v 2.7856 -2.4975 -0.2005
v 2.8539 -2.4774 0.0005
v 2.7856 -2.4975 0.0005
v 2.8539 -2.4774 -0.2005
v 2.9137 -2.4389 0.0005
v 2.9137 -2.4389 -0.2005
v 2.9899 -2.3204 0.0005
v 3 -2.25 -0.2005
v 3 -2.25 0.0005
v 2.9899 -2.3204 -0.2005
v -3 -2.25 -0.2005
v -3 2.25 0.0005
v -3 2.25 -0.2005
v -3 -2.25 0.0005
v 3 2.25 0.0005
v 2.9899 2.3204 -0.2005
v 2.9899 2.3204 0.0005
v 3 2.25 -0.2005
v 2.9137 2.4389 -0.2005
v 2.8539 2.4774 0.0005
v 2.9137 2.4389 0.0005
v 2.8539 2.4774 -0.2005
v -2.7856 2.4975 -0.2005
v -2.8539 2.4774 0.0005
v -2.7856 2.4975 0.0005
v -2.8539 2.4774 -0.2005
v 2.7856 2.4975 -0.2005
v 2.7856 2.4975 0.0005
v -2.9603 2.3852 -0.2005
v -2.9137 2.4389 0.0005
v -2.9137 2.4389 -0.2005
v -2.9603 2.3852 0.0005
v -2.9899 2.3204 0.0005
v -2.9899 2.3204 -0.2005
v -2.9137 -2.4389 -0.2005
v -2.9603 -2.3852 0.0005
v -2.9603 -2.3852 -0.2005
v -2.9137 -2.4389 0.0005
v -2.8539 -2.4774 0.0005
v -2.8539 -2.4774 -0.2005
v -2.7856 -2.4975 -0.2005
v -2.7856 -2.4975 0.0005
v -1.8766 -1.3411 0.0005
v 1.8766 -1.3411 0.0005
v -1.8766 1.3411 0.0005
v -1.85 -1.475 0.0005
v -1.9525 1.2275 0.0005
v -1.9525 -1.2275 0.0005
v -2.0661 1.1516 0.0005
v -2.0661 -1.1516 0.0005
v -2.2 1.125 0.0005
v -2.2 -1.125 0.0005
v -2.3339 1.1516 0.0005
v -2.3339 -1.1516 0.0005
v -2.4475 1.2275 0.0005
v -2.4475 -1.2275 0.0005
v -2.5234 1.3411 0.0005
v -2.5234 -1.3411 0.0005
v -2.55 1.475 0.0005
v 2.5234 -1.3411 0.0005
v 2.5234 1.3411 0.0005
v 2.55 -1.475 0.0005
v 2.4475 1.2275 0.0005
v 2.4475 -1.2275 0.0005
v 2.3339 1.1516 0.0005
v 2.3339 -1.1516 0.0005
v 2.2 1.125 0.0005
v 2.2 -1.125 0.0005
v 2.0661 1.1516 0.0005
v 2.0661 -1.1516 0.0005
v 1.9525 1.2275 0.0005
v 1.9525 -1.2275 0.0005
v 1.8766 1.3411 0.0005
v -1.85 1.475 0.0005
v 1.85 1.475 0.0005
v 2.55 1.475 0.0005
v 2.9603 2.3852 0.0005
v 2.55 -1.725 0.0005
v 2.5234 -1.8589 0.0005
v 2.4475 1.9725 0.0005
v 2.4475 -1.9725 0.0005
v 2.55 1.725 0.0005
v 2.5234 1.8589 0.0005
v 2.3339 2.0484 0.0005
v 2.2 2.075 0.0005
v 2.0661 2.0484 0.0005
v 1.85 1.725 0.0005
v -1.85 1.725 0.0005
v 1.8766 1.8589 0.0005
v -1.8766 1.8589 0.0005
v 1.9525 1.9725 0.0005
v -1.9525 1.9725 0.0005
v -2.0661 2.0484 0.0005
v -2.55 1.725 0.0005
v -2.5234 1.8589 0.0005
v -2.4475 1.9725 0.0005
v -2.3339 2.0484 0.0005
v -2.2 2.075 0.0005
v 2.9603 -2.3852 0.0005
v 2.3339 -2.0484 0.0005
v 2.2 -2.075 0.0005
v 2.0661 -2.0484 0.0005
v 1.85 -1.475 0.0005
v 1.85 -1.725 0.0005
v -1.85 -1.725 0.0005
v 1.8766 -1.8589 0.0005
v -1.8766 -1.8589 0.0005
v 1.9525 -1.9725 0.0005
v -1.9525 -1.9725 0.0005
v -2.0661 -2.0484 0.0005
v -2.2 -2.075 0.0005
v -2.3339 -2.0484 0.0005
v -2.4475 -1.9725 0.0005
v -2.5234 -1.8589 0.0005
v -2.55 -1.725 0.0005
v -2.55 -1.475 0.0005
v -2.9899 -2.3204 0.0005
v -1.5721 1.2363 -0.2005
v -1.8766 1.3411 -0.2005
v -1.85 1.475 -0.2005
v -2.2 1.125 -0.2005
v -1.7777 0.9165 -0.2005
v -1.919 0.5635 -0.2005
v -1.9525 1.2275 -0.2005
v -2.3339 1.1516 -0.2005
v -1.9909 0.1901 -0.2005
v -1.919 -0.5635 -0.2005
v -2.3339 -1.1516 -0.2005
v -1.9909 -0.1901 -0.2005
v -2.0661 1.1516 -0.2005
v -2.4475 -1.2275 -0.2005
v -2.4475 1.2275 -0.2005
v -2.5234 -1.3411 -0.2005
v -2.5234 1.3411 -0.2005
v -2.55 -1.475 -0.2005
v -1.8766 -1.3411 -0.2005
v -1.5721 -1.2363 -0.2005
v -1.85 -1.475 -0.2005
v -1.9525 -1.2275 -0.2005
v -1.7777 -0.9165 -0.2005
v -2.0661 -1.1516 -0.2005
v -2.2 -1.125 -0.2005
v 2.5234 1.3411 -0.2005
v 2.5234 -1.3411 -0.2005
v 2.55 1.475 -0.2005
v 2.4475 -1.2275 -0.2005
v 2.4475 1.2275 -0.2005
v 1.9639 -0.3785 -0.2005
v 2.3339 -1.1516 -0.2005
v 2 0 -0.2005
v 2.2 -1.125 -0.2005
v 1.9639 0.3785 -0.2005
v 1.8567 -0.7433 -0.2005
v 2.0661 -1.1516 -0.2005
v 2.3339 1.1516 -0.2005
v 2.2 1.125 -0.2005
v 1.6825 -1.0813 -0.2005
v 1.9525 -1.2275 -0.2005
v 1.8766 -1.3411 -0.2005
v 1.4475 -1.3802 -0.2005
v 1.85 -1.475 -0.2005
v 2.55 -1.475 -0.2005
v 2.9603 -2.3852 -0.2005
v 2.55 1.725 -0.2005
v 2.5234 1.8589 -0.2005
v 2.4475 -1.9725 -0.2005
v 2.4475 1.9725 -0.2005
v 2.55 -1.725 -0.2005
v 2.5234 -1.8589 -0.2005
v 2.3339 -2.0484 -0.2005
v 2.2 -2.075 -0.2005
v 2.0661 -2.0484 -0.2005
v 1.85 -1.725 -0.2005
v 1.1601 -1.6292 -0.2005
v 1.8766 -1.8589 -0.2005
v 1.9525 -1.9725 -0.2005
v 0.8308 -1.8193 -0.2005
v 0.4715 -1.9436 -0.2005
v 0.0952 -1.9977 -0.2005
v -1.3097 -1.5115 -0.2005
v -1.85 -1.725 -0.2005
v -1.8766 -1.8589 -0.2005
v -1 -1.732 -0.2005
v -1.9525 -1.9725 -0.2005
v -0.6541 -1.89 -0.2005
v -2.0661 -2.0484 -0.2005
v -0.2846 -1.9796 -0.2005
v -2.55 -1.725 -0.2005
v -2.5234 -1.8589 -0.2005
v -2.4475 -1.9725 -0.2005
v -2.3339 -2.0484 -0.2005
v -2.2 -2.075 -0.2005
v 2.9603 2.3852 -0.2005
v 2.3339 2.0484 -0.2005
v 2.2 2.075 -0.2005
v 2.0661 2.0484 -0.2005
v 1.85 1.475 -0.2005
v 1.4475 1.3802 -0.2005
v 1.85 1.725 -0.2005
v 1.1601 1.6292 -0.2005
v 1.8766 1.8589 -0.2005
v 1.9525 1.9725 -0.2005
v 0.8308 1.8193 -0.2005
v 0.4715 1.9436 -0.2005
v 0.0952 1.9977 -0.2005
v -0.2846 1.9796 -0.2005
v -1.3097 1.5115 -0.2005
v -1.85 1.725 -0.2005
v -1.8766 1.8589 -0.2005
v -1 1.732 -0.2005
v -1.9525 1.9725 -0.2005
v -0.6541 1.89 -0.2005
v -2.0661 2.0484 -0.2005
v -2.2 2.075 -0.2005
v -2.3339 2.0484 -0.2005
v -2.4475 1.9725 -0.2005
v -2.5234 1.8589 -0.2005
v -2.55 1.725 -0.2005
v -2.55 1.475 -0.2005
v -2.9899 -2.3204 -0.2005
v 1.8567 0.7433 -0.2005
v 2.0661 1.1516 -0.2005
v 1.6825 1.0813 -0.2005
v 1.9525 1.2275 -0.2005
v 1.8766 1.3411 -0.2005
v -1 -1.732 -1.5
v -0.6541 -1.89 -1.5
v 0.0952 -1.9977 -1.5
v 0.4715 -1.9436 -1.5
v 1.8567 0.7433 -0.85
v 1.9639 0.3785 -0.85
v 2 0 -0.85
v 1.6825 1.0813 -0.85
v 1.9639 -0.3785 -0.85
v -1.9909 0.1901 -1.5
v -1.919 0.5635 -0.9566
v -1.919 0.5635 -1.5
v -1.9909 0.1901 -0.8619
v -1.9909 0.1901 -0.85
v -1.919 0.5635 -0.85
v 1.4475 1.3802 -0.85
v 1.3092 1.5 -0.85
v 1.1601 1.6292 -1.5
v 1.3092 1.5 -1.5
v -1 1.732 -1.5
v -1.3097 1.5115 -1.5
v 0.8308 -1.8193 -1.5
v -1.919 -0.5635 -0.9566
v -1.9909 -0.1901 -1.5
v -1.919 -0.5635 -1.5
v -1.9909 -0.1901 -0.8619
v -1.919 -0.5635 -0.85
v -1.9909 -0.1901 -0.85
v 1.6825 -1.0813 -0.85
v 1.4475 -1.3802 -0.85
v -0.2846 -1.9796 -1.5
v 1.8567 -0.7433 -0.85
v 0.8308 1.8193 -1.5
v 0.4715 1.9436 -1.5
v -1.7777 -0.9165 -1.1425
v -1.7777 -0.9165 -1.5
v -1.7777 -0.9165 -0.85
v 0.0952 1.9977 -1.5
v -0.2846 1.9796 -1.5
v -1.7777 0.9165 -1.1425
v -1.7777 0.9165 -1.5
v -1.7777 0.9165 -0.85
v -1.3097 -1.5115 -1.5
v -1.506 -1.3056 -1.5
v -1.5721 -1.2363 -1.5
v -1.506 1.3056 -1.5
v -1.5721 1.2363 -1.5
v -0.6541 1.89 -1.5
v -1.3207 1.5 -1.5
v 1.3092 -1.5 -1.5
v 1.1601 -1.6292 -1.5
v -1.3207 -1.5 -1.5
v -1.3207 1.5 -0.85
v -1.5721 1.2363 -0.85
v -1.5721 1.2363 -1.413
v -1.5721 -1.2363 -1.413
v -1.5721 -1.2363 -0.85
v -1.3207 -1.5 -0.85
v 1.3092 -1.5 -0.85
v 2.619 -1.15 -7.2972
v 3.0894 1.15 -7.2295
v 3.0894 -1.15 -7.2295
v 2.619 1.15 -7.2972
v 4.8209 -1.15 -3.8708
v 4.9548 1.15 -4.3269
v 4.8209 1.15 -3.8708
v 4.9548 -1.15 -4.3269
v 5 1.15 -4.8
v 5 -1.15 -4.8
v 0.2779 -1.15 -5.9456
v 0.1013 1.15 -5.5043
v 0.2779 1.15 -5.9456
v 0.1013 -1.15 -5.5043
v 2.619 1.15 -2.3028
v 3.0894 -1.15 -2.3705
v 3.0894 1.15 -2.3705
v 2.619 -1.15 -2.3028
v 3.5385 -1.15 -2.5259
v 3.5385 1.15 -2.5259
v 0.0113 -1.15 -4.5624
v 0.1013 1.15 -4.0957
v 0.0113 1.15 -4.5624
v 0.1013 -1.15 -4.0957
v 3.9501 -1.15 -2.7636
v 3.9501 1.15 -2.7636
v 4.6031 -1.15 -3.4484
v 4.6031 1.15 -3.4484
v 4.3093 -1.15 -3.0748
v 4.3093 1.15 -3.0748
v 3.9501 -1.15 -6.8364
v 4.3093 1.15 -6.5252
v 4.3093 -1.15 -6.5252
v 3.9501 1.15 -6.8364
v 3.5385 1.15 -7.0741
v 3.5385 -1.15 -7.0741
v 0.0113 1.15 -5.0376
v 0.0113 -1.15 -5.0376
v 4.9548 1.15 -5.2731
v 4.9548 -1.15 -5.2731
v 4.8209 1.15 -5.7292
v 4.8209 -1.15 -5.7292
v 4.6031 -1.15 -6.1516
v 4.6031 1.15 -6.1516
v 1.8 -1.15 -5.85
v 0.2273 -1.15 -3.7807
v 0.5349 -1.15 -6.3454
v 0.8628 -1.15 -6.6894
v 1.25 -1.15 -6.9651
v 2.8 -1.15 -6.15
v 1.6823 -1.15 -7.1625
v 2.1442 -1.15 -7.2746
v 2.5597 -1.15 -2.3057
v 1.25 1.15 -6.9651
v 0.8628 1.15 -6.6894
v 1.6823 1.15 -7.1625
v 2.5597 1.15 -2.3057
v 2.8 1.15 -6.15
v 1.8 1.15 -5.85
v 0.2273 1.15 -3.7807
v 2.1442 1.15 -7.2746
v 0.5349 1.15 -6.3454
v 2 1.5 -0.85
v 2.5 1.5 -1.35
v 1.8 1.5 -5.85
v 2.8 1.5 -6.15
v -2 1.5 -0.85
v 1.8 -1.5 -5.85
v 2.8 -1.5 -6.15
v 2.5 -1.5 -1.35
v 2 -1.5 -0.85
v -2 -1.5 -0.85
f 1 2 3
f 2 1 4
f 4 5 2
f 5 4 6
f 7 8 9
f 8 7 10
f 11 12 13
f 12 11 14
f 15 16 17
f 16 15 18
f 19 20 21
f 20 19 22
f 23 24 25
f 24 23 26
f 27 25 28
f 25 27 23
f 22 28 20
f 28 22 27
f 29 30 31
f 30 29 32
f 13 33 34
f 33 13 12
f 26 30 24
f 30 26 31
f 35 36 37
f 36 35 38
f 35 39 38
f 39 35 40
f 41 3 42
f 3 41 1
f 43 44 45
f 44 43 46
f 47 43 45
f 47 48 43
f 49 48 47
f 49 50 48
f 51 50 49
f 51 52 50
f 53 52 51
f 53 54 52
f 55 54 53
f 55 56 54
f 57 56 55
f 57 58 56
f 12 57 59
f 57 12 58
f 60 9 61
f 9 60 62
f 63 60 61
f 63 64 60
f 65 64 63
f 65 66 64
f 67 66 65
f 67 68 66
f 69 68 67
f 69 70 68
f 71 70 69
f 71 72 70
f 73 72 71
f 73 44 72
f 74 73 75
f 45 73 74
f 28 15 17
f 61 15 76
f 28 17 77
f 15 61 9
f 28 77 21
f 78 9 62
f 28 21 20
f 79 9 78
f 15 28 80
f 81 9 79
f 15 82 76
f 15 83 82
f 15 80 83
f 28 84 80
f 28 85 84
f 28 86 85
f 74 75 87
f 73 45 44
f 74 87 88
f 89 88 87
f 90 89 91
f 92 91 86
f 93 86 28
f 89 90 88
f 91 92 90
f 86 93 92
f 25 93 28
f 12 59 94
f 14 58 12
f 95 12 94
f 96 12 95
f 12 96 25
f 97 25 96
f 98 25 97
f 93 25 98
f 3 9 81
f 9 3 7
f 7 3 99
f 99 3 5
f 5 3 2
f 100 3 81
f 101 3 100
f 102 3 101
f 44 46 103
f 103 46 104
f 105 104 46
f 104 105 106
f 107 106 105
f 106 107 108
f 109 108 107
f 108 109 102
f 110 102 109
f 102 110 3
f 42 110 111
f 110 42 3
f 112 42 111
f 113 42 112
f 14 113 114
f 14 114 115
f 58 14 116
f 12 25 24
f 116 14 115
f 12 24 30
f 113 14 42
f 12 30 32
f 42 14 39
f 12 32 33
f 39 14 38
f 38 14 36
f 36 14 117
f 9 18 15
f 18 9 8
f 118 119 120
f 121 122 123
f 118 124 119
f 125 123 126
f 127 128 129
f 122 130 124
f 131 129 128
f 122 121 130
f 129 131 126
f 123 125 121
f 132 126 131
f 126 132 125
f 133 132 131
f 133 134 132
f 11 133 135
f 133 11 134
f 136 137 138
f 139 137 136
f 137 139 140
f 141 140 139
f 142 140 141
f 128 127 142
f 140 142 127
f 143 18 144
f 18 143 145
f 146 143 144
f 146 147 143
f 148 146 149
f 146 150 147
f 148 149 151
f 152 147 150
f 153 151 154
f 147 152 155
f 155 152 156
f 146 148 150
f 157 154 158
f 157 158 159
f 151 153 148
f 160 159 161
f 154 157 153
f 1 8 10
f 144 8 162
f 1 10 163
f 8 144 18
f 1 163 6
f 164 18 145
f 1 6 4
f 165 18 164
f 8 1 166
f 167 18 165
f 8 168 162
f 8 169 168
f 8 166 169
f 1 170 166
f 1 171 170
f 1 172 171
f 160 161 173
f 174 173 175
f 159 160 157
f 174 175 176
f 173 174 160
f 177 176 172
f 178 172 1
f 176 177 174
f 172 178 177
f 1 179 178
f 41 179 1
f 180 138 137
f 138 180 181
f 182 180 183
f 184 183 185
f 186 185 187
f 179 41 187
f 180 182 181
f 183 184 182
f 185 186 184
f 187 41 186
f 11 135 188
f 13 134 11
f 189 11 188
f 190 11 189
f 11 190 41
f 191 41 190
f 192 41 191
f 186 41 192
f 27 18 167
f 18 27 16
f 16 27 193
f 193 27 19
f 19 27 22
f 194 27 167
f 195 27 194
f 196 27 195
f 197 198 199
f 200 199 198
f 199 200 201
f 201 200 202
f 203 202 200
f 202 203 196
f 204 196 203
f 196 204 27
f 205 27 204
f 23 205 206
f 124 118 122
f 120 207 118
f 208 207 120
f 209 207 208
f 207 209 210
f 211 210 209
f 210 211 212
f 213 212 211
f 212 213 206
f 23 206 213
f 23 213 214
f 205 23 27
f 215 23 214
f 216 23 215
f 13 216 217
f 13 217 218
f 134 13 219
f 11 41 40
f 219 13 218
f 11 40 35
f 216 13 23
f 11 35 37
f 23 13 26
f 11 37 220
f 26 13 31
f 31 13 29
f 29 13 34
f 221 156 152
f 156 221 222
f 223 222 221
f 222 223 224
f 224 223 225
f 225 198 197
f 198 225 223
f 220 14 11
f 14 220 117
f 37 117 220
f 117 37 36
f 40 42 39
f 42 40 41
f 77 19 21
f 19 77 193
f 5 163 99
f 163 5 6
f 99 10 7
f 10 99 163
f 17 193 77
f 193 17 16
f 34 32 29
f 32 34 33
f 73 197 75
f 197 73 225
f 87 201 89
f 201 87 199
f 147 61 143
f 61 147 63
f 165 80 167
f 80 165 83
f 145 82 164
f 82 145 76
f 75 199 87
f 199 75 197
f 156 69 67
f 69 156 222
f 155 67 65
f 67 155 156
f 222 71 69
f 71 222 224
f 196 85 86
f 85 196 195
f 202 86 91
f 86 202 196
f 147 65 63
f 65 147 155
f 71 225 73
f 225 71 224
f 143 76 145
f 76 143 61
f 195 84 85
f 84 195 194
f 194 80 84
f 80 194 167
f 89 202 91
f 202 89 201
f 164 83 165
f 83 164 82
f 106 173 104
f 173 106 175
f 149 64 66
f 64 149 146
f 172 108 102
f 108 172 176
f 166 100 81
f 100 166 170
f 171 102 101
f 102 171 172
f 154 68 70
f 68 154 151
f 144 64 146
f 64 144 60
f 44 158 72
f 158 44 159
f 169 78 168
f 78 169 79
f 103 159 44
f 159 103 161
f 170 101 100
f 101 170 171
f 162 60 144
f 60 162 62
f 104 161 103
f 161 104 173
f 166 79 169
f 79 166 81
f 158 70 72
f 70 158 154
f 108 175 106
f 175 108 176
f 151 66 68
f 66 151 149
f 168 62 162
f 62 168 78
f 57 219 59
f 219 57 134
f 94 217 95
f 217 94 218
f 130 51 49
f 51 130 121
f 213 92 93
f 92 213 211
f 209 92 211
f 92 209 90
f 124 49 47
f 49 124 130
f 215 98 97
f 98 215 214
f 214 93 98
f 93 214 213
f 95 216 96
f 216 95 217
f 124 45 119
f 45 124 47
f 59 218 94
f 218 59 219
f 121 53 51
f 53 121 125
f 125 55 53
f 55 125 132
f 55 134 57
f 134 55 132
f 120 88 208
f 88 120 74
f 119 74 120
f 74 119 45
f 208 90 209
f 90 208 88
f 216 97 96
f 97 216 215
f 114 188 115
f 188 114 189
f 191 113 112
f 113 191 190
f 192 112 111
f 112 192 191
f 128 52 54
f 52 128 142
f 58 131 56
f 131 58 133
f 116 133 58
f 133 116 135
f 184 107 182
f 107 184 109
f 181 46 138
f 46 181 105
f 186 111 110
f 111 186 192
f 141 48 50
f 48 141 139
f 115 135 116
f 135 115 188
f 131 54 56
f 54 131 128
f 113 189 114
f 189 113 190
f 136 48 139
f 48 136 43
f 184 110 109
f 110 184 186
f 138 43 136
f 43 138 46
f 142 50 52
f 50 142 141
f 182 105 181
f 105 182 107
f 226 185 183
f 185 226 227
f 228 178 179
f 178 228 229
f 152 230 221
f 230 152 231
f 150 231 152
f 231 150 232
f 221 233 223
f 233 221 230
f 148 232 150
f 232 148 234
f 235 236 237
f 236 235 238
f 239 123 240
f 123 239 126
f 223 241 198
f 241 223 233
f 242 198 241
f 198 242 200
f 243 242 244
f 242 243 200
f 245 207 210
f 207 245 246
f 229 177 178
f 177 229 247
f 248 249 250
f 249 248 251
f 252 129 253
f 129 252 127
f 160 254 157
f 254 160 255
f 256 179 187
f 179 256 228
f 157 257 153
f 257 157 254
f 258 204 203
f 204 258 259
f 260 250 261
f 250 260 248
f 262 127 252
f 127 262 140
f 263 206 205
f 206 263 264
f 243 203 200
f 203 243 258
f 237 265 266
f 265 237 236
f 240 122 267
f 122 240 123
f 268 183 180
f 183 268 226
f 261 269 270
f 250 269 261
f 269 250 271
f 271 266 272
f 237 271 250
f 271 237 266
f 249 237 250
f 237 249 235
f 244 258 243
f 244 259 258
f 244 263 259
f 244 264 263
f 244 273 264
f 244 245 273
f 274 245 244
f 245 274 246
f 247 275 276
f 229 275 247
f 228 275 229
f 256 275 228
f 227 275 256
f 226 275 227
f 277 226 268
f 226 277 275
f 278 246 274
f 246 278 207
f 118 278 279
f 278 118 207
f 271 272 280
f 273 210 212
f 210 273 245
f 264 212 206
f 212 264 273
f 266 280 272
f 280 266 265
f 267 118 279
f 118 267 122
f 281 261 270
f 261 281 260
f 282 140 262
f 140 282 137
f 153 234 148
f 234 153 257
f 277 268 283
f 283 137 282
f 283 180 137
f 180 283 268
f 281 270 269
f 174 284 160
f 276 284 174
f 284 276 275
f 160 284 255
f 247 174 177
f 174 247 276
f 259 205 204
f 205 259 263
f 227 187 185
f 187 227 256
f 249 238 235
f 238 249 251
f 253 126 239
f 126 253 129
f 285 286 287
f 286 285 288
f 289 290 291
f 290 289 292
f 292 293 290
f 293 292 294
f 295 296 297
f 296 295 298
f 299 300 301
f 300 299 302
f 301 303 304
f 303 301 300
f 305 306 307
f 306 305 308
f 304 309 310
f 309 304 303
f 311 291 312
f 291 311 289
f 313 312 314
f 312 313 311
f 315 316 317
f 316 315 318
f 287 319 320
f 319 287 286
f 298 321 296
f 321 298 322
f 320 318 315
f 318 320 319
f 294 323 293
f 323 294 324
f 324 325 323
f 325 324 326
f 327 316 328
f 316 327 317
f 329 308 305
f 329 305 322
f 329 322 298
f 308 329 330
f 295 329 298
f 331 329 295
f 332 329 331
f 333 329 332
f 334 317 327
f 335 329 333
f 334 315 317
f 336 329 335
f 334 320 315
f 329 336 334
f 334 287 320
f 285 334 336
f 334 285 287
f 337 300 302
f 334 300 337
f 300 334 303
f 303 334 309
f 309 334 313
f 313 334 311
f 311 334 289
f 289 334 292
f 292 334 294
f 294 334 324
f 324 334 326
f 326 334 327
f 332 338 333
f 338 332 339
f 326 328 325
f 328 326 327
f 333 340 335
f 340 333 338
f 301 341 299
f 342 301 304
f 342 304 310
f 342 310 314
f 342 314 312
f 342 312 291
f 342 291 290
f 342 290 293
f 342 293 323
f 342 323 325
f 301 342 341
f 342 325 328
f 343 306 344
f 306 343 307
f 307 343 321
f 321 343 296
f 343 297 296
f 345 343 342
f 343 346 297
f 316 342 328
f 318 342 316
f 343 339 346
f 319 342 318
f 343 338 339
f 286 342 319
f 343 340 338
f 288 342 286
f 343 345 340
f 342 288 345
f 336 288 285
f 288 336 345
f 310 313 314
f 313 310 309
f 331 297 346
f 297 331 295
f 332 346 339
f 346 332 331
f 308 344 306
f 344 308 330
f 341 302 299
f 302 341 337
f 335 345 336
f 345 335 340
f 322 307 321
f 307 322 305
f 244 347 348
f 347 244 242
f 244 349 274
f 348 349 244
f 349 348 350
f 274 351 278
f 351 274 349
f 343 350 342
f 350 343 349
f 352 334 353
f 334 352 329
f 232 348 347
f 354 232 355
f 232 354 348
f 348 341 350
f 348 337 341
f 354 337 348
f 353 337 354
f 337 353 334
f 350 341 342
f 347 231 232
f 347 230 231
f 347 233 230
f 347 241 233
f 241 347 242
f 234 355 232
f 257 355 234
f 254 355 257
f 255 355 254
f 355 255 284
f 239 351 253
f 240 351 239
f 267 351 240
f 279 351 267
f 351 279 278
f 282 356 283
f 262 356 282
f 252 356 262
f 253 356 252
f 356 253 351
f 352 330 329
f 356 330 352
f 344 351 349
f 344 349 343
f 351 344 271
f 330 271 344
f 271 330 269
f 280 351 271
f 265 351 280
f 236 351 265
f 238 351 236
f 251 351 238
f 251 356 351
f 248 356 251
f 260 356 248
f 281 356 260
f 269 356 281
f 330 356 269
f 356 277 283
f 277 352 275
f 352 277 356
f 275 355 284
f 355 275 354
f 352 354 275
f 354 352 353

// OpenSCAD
// use <washer.scad> 

fixing_plate_t = 0.2;
hinge_cylinder_h = 1.3;
hinge_cylinder_d = 4;


/*
    length = 13.5; // workroom uses 1 cm longer bolts than before
    thickness = 1.2;
    hex_diameter = 2.0;
    hex_length = 0.7;
    washer_thickness = 0.18;
    bighole_pos_coeff = 1.4; 
 
    rotate([0,90,rotation]) color([0.4,0.4,0.8])
    {
        cylinder(h=length, r=thickness/2, $fn = 12);
        
        translate([0,0,-hex_length]) 
            cylinder(h=hex_length, r=hex_diameter/2, $fn = 6);
    
        translate([0,0,cw_w + bighole_pos_coeff * cw_w+2*washer_thickness]) rotate([0,-90,0]) {
            washer(0, washer_thickness);
            nut(0);
        }
    }
    
    washer(rotation, washer_thickness);
    
}
*/

module wheel_assembly()
{
    fixing_plate();
    hinge_cylinder(-fixing_plate_t);
    wheel(-fixing_plate_t-hinge_cylinder_h);
    wheel_fixture(-fixing_plate_t-hinge_cylinder_h/2);
}

module fixing_plate()
{
    fixing_plate_l = 6;
    fixing_plate_w = 5;
    rounded_end_d = 0.5;
    hole_dx = 0.8;
    hole_dy = 0.9;
    
    translate([0,0,-fixing_plate_t/2]) 
    difference()
    {
        minkowski()
        {
            cube([fixing_plate_l-rounded_end_d, fixing_plate_w-rounded_end_d, 0.001], center = true);
            cylinder(d=rounded_end_d,h=fixing_plate_t, center=true, $fn = 22);
        }
        translate([(fixing_plate_l/2-hole_dx),(fixing_plate_w/2-hole_dy),0]) 
        fixing_plate_hole();
        translate([(fixing_plate_l/2-hole_dx),-(fixing_plate_w/2-hole_dy),0]) 
        fixing_plate_hole();
        translate([-(fixing_plate_l/2-hole_dx),(fixing_plate_w/2-hole_dy), 0]) 
        fixing_plate_hole();
        translate([-(fixing_plate_l/2-hole_dx),-(fixing_plate_w/2-hole_dy),0]) 
        fixing_plate_hole();
    }
}

module fixing_plate_hole()
{
    hole_size = 0.7;
    center_points_d = 0.25;
    hole_h = fixing_plate_t + 0.1;

    hull() {
        translate([0,-center_points_d/2,0])
        cylinder(h=hole_h, d=hole_size, center = true, $fn = 16);

        translate([0,center_points_d/2,0])
        cylinder(h=hole_h, d=hole_size, center = true, $fn = 16);
    }
}

module hinge_cylinder(top_y)
{
    
    translate([0,0,top_y-hinge_cylinder_h/2])
    cylinder(d=hinge_cylinder_d,h=hinge_cylinder_h, center=true, $fn = 33);
}

module wheel(top_y)
{
    wheel_d = 5;
    wheel_t = 2.3;
    wheel_dz = 3.3;
    wheel_dx = 2.5;

    translate([wheel_dx,0,top_y-wheel_dz])
    rotate([90,0,0])
    cylinder(d=wheel_d,h=wheel_t, center=true, $fn = 33);
}

module wheel_fixture(top_y)
{
    translate([0,0,top_y])
    rotate([-90,0,0])
    linear_extrude(3, center = true) 
        polygon(points=[[-hinge_cylinder_d/2,0],
            [hinge_cylinder_d/2, 0],
            [2.5, 0.5],
            [2.8, 5.3],
            [1.8, 5.0]]);
 
}

wheel_assembly();
